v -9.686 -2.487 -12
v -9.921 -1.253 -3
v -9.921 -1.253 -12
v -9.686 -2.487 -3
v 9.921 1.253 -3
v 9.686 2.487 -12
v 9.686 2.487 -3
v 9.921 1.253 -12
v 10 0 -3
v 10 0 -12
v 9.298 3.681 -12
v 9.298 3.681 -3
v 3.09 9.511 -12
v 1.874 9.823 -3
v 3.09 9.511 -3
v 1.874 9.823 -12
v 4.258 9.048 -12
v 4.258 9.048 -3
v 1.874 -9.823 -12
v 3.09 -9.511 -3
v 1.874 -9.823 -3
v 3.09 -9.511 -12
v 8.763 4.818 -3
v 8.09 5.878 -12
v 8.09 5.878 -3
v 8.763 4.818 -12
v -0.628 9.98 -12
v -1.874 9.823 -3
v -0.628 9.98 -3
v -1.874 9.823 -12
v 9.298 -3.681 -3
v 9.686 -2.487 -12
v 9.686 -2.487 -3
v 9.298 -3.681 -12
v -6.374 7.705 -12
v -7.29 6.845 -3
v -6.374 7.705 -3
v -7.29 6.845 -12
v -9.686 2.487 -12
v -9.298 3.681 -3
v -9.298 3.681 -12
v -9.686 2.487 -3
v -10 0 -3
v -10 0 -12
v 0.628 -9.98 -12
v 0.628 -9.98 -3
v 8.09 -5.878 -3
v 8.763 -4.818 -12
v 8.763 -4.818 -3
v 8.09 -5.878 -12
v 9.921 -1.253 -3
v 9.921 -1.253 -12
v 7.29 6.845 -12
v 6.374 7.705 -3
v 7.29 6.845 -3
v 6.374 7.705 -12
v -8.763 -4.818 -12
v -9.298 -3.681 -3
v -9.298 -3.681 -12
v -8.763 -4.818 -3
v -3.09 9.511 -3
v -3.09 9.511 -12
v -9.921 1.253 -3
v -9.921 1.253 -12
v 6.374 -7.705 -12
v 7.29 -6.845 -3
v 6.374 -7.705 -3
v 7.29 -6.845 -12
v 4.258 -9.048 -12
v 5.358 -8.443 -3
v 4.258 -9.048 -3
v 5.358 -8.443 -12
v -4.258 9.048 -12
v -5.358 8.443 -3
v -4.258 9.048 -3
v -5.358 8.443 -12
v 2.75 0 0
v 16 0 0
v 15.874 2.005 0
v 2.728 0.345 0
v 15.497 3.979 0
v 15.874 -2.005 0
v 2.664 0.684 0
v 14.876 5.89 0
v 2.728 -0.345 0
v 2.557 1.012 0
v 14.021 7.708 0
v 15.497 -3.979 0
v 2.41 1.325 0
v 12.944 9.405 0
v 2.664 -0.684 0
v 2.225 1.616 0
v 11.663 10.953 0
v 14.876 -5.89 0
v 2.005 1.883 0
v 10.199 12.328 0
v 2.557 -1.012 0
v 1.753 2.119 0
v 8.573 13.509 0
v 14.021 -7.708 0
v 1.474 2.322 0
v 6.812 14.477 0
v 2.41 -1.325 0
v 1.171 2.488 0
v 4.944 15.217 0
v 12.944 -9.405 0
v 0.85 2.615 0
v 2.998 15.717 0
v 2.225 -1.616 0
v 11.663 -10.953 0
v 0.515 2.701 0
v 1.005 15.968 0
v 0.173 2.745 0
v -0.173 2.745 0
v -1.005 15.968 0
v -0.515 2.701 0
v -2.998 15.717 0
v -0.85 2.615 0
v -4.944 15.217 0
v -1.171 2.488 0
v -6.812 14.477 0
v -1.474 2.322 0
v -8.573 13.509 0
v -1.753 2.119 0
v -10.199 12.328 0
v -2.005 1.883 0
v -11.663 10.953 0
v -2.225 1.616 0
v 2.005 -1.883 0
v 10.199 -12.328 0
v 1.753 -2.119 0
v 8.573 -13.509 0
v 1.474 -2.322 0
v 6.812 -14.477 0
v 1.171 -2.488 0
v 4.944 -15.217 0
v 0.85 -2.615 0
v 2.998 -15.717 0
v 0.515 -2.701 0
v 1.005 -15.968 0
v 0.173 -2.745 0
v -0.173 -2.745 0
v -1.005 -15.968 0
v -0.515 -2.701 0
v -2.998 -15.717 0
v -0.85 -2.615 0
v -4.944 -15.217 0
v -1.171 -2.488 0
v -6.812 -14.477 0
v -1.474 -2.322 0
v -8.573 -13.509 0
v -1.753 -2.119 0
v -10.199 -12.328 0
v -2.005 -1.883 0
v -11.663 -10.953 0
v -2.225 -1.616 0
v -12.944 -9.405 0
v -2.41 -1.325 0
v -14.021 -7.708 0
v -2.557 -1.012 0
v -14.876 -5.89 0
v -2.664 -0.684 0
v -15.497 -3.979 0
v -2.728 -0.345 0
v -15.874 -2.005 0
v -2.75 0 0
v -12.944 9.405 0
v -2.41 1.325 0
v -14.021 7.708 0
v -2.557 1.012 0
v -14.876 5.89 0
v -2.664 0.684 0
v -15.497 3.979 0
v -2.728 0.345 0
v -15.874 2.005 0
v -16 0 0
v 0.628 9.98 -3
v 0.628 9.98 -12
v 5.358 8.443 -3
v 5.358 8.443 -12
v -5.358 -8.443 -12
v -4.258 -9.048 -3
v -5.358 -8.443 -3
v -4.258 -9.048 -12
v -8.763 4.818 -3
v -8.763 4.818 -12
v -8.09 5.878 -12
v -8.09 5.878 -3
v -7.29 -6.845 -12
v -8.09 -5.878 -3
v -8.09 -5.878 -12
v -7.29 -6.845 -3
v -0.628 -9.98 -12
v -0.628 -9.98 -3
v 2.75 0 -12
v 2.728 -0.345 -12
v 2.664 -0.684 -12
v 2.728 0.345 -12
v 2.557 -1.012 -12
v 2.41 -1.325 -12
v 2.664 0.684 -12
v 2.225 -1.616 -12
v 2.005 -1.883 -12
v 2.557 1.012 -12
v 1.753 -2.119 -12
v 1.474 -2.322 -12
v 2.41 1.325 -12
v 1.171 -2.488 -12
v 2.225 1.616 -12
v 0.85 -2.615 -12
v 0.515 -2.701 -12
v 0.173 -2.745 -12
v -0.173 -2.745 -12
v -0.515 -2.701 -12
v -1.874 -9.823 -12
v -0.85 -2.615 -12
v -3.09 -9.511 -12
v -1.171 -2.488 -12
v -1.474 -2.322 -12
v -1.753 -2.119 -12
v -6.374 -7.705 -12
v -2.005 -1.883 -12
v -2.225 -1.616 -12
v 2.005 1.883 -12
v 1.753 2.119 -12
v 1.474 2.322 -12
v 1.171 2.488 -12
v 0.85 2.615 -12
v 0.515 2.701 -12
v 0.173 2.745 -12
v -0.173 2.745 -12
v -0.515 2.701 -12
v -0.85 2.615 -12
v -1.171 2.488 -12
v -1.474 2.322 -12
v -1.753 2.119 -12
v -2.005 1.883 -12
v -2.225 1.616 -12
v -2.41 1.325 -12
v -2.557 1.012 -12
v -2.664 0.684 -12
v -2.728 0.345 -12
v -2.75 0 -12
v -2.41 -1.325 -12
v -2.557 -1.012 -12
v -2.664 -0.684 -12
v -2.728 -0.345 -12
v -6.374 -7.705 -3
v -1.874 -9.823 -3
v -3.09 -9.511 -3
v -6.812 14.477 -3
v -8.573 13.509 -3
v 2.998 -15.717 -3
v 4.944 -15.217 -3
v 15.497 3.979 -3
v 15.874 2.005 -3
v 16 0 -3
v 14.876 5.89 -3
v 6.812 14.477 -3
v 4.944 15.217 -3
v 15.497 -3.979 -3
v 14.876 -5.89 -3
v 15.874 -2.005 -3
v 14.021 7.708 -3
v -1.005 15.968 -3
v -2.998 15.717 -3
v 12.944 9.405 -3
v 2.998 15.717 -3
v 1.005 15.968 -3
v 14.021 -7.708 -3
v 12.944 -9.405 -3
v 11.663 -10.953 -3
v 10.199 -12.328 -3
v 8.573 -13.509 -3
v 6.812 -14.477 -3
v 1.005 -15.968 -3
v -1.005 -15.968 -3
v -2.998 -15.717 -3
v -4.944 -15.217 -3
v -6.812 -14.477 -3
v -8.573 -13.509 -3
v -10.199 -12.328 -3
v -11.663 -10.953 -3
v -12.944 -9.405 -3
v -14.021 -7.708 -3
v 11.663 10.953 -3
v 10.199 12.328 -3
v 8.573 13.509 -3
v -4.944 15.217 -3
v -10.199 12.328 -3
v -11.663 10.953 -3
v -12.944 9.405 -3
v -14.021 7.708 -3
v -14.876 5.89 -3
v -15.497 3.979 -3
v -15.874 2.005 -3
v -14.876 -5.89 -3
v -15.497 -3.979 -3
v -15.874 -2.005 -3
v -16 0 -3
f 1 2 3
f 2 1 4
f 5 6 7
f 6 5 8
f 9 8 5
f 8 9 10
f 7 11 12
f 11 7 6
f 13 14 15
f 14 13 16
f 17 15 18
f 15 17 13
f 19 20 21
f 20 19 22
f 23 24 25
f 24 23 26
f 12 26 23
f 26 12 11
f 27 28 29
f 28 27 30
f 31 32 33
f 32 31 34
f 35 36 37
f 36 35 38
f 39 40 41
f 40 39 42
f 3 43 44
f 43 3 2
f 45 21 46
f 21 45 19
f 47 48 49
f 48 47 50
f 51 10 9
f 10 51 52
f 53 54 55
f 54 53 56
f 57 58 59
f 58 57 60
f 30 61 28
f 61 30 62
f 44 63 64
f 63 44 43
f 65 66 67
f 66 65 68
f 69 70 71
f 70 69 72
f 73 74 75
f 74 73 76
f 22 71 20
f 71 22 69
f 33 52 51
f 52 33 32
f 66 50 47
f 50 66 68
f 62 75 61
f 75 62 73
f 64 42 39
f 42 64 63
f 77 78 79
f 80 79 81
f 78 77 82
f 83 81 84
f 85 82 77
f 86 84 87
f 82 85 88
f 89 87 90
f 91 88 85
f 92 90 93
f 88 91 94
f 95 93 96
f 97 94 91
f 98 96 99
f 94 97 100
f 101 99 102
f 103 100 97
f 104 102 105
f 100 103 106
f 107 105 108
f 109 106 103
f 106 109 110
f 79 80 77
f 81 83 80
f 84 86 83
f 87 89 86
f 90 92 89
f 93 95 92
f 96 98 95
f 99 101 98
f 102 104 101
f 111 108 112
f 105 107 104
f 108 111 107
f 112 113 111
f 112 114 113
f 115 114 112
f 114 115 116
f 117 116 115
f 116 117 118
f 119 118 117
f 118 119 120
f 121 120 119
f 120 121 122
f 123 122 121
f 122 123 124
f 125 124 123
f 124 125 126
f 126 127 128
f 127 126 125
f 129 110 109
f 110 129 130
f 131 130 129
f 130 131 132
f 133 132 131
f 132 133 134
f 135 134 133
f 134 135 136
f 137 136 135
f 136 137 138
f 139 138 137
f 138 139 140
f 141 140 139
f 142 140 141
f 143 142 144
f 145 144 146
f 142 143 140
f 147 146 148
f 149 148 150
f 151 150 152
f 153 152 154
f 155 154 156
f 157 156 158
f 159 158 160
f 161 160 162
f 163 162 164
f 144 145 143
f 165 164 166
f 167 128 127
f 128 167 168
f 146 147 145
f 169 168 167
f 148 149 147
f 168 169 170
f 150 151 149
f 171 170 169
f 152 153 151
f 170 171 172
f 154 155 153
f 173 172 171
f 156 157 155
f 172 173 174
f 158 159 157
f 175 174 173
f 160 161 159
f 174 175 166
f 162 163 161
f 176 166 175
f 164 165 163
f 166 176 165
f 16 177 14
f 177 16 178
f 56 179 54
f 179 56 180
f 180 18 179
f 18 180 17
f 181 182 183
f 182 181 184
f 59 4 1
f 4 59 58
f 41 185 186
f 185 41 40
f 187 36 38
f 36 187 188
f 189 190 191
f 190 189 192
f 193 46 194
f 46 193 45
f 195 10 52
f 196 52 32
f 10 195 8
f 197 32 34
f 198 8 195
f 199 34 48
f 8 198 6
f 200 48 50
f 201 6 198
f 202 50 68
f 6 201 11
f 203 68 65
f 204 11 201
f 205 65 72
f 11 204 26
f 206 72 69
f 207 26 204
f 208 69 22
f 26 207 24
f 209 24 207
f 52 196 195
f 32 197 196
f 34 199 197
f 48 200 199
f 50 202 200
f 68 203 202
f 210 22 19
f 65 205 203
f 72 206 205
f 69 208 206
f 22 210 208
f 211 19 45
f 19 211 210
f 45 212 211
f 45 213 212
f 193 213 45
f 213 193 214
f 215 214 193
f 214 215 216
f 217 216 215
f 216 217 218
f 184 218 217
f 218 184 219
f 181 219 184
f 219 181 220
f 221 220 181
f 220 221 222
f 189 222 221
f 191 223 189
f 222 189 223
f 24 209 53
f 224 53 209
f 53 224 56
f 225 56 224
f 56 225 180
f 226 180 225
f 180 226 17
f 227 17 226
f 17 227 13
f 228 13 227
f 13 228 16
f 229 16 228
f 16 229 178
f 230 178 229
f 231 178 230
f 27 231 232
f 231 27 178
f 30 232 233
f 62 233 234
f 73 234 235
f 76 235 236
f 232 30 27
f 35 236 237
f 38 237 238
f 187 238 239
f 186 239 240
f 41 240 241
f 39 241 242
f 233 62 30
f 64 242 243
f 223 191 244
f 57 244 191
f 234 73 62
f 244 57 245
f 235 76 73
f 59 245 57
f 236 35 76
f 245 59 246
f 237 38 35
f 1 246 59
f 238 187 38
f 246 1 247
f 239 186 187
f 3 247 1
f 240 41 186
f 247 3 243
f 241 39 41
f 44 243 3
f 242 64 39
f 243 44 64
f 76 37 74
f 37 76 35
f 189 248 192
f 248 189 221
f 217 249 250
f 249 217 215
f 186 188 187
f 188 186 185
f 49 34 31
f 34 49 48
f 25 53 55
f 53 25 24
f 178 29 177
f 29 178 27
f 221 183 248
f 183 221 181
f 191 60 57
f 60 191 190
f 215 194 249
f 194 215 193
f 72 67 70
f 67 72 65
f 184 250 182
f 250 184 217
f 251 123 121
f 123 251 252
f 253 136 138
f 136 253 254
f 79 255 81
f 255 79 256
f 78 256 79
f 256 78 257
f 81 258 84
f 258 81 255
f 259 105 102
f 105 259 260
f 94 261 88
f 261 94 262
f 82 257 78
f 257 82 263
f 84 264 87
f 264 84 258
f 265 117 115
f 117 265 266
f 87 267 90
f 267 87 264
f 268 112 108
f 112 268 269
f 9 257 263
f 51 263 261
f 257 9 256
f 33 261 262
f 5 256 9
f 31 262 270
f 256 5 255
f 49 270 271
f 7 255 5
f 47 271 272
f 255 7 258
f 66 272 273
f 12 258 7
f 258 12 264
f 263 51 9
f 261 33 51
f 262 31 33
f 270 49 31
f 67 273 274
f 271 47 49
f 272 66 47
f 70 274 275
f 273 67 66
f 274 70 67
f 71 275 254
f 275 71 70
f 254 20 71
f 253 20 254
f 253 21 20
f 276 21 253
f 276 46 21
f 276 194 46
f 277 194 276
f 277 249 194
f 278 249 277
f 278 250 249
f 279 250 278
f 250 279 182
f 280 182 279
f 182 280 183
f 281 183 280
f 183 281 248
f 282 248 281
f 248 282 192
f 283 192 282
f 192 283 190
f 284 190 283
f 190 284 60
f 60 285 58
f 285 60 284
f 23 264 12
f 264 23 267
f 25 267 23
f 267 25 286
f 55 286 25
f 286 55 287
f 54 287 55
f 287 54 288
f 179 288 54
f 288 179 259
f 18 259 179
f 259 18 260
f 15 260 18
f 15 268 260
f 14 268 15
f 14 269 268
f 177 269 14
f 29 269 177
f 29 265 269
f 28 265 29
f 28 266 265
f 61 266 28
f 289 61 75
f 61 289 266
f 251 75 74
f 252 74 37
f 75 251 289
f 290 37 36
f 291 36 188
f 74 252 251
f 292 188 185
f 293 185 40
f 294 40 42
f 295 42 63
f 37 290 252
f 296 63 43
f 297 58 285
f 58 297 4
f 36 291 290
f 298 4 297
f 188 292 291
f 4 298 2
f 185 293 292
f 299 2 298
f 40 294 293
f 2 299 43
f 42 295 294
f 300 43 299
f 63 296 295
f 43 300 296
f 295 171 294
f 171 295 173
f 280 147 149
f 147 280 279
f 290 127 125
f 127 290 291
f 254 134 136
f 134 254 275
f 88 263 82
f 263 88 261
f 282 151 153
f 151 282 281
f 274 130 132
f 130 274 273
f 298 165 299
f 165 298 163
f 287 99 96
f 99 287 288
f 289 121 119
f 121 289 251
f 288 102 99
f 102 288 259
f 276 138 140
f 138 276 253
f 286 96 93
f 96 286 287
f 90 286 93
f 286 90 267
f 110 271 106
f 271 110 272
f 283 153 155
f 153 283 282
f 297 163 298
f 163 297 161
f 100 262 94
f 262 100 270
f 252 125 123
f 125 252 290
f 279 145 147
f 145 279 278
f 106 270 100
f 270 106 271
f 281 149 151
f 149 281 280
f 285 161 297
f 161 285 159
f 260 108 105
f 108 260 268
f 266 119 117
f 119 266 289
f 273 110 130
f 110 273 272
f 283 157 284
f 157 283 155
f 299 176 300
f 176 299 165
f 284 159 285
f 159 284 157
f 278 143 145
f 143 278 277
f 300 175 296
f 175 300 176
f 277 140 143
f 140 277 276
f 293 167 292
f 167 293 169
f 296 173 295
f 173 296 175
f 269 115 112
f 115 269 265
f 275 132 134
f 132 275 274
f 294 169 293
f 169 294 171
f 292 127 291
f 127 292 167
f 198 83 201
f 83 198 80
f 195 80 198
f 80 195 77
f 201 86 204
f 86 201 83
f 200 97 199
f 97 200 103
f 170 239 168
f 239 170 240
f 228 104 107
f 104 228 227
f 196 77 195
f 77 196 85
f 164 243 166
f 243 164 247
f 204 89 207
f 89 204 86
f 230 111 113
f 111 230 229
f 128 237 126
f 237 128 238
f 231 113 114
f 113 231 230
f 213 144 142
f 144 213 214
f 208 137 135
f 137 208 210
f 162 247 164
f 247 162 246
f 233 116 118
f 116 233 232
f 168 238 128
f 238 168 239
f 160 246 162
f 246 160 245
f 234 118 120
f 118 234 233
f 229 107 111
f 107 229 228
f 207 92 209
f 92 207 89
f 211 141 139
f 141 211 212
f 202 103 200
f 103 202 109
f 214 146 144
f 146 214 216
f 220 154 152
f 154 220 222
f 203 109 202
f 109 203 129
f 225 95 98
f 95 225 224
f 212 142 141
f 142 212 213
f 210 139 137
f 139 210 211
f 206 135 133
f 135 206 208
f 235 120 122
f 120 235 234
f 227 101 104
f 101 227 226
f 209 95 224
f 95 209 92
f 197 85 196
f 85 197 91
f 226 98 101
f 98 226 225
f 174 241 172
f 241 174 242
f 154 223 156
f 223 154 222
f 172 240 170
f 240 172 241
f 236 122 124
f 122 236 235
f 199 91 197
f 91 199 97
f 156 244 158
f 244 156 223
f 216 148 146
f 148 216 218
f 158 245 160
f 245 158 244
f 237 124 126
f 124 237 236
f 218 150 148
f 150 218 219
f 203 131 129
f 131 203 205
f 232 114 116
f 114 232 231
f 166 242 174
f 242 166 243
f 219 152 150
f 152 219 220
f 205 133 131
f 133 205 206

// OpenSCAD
$fn = 50;


difference() {
	union() {
		translate(v = [0, 0, -12.0000000000]) {
			cylinder(h = 12, r = 10.0000000000);
		}
		translate(v = [0, 0, -3.0000000000]) {
			cylinder(h = 3, r = 16.0000000000);
		}
	}
	union() {
		#translate(v = [0, 0, -12]) {
			cylinder(h = 12, r = 2.7500000000);
		}
	}
}
